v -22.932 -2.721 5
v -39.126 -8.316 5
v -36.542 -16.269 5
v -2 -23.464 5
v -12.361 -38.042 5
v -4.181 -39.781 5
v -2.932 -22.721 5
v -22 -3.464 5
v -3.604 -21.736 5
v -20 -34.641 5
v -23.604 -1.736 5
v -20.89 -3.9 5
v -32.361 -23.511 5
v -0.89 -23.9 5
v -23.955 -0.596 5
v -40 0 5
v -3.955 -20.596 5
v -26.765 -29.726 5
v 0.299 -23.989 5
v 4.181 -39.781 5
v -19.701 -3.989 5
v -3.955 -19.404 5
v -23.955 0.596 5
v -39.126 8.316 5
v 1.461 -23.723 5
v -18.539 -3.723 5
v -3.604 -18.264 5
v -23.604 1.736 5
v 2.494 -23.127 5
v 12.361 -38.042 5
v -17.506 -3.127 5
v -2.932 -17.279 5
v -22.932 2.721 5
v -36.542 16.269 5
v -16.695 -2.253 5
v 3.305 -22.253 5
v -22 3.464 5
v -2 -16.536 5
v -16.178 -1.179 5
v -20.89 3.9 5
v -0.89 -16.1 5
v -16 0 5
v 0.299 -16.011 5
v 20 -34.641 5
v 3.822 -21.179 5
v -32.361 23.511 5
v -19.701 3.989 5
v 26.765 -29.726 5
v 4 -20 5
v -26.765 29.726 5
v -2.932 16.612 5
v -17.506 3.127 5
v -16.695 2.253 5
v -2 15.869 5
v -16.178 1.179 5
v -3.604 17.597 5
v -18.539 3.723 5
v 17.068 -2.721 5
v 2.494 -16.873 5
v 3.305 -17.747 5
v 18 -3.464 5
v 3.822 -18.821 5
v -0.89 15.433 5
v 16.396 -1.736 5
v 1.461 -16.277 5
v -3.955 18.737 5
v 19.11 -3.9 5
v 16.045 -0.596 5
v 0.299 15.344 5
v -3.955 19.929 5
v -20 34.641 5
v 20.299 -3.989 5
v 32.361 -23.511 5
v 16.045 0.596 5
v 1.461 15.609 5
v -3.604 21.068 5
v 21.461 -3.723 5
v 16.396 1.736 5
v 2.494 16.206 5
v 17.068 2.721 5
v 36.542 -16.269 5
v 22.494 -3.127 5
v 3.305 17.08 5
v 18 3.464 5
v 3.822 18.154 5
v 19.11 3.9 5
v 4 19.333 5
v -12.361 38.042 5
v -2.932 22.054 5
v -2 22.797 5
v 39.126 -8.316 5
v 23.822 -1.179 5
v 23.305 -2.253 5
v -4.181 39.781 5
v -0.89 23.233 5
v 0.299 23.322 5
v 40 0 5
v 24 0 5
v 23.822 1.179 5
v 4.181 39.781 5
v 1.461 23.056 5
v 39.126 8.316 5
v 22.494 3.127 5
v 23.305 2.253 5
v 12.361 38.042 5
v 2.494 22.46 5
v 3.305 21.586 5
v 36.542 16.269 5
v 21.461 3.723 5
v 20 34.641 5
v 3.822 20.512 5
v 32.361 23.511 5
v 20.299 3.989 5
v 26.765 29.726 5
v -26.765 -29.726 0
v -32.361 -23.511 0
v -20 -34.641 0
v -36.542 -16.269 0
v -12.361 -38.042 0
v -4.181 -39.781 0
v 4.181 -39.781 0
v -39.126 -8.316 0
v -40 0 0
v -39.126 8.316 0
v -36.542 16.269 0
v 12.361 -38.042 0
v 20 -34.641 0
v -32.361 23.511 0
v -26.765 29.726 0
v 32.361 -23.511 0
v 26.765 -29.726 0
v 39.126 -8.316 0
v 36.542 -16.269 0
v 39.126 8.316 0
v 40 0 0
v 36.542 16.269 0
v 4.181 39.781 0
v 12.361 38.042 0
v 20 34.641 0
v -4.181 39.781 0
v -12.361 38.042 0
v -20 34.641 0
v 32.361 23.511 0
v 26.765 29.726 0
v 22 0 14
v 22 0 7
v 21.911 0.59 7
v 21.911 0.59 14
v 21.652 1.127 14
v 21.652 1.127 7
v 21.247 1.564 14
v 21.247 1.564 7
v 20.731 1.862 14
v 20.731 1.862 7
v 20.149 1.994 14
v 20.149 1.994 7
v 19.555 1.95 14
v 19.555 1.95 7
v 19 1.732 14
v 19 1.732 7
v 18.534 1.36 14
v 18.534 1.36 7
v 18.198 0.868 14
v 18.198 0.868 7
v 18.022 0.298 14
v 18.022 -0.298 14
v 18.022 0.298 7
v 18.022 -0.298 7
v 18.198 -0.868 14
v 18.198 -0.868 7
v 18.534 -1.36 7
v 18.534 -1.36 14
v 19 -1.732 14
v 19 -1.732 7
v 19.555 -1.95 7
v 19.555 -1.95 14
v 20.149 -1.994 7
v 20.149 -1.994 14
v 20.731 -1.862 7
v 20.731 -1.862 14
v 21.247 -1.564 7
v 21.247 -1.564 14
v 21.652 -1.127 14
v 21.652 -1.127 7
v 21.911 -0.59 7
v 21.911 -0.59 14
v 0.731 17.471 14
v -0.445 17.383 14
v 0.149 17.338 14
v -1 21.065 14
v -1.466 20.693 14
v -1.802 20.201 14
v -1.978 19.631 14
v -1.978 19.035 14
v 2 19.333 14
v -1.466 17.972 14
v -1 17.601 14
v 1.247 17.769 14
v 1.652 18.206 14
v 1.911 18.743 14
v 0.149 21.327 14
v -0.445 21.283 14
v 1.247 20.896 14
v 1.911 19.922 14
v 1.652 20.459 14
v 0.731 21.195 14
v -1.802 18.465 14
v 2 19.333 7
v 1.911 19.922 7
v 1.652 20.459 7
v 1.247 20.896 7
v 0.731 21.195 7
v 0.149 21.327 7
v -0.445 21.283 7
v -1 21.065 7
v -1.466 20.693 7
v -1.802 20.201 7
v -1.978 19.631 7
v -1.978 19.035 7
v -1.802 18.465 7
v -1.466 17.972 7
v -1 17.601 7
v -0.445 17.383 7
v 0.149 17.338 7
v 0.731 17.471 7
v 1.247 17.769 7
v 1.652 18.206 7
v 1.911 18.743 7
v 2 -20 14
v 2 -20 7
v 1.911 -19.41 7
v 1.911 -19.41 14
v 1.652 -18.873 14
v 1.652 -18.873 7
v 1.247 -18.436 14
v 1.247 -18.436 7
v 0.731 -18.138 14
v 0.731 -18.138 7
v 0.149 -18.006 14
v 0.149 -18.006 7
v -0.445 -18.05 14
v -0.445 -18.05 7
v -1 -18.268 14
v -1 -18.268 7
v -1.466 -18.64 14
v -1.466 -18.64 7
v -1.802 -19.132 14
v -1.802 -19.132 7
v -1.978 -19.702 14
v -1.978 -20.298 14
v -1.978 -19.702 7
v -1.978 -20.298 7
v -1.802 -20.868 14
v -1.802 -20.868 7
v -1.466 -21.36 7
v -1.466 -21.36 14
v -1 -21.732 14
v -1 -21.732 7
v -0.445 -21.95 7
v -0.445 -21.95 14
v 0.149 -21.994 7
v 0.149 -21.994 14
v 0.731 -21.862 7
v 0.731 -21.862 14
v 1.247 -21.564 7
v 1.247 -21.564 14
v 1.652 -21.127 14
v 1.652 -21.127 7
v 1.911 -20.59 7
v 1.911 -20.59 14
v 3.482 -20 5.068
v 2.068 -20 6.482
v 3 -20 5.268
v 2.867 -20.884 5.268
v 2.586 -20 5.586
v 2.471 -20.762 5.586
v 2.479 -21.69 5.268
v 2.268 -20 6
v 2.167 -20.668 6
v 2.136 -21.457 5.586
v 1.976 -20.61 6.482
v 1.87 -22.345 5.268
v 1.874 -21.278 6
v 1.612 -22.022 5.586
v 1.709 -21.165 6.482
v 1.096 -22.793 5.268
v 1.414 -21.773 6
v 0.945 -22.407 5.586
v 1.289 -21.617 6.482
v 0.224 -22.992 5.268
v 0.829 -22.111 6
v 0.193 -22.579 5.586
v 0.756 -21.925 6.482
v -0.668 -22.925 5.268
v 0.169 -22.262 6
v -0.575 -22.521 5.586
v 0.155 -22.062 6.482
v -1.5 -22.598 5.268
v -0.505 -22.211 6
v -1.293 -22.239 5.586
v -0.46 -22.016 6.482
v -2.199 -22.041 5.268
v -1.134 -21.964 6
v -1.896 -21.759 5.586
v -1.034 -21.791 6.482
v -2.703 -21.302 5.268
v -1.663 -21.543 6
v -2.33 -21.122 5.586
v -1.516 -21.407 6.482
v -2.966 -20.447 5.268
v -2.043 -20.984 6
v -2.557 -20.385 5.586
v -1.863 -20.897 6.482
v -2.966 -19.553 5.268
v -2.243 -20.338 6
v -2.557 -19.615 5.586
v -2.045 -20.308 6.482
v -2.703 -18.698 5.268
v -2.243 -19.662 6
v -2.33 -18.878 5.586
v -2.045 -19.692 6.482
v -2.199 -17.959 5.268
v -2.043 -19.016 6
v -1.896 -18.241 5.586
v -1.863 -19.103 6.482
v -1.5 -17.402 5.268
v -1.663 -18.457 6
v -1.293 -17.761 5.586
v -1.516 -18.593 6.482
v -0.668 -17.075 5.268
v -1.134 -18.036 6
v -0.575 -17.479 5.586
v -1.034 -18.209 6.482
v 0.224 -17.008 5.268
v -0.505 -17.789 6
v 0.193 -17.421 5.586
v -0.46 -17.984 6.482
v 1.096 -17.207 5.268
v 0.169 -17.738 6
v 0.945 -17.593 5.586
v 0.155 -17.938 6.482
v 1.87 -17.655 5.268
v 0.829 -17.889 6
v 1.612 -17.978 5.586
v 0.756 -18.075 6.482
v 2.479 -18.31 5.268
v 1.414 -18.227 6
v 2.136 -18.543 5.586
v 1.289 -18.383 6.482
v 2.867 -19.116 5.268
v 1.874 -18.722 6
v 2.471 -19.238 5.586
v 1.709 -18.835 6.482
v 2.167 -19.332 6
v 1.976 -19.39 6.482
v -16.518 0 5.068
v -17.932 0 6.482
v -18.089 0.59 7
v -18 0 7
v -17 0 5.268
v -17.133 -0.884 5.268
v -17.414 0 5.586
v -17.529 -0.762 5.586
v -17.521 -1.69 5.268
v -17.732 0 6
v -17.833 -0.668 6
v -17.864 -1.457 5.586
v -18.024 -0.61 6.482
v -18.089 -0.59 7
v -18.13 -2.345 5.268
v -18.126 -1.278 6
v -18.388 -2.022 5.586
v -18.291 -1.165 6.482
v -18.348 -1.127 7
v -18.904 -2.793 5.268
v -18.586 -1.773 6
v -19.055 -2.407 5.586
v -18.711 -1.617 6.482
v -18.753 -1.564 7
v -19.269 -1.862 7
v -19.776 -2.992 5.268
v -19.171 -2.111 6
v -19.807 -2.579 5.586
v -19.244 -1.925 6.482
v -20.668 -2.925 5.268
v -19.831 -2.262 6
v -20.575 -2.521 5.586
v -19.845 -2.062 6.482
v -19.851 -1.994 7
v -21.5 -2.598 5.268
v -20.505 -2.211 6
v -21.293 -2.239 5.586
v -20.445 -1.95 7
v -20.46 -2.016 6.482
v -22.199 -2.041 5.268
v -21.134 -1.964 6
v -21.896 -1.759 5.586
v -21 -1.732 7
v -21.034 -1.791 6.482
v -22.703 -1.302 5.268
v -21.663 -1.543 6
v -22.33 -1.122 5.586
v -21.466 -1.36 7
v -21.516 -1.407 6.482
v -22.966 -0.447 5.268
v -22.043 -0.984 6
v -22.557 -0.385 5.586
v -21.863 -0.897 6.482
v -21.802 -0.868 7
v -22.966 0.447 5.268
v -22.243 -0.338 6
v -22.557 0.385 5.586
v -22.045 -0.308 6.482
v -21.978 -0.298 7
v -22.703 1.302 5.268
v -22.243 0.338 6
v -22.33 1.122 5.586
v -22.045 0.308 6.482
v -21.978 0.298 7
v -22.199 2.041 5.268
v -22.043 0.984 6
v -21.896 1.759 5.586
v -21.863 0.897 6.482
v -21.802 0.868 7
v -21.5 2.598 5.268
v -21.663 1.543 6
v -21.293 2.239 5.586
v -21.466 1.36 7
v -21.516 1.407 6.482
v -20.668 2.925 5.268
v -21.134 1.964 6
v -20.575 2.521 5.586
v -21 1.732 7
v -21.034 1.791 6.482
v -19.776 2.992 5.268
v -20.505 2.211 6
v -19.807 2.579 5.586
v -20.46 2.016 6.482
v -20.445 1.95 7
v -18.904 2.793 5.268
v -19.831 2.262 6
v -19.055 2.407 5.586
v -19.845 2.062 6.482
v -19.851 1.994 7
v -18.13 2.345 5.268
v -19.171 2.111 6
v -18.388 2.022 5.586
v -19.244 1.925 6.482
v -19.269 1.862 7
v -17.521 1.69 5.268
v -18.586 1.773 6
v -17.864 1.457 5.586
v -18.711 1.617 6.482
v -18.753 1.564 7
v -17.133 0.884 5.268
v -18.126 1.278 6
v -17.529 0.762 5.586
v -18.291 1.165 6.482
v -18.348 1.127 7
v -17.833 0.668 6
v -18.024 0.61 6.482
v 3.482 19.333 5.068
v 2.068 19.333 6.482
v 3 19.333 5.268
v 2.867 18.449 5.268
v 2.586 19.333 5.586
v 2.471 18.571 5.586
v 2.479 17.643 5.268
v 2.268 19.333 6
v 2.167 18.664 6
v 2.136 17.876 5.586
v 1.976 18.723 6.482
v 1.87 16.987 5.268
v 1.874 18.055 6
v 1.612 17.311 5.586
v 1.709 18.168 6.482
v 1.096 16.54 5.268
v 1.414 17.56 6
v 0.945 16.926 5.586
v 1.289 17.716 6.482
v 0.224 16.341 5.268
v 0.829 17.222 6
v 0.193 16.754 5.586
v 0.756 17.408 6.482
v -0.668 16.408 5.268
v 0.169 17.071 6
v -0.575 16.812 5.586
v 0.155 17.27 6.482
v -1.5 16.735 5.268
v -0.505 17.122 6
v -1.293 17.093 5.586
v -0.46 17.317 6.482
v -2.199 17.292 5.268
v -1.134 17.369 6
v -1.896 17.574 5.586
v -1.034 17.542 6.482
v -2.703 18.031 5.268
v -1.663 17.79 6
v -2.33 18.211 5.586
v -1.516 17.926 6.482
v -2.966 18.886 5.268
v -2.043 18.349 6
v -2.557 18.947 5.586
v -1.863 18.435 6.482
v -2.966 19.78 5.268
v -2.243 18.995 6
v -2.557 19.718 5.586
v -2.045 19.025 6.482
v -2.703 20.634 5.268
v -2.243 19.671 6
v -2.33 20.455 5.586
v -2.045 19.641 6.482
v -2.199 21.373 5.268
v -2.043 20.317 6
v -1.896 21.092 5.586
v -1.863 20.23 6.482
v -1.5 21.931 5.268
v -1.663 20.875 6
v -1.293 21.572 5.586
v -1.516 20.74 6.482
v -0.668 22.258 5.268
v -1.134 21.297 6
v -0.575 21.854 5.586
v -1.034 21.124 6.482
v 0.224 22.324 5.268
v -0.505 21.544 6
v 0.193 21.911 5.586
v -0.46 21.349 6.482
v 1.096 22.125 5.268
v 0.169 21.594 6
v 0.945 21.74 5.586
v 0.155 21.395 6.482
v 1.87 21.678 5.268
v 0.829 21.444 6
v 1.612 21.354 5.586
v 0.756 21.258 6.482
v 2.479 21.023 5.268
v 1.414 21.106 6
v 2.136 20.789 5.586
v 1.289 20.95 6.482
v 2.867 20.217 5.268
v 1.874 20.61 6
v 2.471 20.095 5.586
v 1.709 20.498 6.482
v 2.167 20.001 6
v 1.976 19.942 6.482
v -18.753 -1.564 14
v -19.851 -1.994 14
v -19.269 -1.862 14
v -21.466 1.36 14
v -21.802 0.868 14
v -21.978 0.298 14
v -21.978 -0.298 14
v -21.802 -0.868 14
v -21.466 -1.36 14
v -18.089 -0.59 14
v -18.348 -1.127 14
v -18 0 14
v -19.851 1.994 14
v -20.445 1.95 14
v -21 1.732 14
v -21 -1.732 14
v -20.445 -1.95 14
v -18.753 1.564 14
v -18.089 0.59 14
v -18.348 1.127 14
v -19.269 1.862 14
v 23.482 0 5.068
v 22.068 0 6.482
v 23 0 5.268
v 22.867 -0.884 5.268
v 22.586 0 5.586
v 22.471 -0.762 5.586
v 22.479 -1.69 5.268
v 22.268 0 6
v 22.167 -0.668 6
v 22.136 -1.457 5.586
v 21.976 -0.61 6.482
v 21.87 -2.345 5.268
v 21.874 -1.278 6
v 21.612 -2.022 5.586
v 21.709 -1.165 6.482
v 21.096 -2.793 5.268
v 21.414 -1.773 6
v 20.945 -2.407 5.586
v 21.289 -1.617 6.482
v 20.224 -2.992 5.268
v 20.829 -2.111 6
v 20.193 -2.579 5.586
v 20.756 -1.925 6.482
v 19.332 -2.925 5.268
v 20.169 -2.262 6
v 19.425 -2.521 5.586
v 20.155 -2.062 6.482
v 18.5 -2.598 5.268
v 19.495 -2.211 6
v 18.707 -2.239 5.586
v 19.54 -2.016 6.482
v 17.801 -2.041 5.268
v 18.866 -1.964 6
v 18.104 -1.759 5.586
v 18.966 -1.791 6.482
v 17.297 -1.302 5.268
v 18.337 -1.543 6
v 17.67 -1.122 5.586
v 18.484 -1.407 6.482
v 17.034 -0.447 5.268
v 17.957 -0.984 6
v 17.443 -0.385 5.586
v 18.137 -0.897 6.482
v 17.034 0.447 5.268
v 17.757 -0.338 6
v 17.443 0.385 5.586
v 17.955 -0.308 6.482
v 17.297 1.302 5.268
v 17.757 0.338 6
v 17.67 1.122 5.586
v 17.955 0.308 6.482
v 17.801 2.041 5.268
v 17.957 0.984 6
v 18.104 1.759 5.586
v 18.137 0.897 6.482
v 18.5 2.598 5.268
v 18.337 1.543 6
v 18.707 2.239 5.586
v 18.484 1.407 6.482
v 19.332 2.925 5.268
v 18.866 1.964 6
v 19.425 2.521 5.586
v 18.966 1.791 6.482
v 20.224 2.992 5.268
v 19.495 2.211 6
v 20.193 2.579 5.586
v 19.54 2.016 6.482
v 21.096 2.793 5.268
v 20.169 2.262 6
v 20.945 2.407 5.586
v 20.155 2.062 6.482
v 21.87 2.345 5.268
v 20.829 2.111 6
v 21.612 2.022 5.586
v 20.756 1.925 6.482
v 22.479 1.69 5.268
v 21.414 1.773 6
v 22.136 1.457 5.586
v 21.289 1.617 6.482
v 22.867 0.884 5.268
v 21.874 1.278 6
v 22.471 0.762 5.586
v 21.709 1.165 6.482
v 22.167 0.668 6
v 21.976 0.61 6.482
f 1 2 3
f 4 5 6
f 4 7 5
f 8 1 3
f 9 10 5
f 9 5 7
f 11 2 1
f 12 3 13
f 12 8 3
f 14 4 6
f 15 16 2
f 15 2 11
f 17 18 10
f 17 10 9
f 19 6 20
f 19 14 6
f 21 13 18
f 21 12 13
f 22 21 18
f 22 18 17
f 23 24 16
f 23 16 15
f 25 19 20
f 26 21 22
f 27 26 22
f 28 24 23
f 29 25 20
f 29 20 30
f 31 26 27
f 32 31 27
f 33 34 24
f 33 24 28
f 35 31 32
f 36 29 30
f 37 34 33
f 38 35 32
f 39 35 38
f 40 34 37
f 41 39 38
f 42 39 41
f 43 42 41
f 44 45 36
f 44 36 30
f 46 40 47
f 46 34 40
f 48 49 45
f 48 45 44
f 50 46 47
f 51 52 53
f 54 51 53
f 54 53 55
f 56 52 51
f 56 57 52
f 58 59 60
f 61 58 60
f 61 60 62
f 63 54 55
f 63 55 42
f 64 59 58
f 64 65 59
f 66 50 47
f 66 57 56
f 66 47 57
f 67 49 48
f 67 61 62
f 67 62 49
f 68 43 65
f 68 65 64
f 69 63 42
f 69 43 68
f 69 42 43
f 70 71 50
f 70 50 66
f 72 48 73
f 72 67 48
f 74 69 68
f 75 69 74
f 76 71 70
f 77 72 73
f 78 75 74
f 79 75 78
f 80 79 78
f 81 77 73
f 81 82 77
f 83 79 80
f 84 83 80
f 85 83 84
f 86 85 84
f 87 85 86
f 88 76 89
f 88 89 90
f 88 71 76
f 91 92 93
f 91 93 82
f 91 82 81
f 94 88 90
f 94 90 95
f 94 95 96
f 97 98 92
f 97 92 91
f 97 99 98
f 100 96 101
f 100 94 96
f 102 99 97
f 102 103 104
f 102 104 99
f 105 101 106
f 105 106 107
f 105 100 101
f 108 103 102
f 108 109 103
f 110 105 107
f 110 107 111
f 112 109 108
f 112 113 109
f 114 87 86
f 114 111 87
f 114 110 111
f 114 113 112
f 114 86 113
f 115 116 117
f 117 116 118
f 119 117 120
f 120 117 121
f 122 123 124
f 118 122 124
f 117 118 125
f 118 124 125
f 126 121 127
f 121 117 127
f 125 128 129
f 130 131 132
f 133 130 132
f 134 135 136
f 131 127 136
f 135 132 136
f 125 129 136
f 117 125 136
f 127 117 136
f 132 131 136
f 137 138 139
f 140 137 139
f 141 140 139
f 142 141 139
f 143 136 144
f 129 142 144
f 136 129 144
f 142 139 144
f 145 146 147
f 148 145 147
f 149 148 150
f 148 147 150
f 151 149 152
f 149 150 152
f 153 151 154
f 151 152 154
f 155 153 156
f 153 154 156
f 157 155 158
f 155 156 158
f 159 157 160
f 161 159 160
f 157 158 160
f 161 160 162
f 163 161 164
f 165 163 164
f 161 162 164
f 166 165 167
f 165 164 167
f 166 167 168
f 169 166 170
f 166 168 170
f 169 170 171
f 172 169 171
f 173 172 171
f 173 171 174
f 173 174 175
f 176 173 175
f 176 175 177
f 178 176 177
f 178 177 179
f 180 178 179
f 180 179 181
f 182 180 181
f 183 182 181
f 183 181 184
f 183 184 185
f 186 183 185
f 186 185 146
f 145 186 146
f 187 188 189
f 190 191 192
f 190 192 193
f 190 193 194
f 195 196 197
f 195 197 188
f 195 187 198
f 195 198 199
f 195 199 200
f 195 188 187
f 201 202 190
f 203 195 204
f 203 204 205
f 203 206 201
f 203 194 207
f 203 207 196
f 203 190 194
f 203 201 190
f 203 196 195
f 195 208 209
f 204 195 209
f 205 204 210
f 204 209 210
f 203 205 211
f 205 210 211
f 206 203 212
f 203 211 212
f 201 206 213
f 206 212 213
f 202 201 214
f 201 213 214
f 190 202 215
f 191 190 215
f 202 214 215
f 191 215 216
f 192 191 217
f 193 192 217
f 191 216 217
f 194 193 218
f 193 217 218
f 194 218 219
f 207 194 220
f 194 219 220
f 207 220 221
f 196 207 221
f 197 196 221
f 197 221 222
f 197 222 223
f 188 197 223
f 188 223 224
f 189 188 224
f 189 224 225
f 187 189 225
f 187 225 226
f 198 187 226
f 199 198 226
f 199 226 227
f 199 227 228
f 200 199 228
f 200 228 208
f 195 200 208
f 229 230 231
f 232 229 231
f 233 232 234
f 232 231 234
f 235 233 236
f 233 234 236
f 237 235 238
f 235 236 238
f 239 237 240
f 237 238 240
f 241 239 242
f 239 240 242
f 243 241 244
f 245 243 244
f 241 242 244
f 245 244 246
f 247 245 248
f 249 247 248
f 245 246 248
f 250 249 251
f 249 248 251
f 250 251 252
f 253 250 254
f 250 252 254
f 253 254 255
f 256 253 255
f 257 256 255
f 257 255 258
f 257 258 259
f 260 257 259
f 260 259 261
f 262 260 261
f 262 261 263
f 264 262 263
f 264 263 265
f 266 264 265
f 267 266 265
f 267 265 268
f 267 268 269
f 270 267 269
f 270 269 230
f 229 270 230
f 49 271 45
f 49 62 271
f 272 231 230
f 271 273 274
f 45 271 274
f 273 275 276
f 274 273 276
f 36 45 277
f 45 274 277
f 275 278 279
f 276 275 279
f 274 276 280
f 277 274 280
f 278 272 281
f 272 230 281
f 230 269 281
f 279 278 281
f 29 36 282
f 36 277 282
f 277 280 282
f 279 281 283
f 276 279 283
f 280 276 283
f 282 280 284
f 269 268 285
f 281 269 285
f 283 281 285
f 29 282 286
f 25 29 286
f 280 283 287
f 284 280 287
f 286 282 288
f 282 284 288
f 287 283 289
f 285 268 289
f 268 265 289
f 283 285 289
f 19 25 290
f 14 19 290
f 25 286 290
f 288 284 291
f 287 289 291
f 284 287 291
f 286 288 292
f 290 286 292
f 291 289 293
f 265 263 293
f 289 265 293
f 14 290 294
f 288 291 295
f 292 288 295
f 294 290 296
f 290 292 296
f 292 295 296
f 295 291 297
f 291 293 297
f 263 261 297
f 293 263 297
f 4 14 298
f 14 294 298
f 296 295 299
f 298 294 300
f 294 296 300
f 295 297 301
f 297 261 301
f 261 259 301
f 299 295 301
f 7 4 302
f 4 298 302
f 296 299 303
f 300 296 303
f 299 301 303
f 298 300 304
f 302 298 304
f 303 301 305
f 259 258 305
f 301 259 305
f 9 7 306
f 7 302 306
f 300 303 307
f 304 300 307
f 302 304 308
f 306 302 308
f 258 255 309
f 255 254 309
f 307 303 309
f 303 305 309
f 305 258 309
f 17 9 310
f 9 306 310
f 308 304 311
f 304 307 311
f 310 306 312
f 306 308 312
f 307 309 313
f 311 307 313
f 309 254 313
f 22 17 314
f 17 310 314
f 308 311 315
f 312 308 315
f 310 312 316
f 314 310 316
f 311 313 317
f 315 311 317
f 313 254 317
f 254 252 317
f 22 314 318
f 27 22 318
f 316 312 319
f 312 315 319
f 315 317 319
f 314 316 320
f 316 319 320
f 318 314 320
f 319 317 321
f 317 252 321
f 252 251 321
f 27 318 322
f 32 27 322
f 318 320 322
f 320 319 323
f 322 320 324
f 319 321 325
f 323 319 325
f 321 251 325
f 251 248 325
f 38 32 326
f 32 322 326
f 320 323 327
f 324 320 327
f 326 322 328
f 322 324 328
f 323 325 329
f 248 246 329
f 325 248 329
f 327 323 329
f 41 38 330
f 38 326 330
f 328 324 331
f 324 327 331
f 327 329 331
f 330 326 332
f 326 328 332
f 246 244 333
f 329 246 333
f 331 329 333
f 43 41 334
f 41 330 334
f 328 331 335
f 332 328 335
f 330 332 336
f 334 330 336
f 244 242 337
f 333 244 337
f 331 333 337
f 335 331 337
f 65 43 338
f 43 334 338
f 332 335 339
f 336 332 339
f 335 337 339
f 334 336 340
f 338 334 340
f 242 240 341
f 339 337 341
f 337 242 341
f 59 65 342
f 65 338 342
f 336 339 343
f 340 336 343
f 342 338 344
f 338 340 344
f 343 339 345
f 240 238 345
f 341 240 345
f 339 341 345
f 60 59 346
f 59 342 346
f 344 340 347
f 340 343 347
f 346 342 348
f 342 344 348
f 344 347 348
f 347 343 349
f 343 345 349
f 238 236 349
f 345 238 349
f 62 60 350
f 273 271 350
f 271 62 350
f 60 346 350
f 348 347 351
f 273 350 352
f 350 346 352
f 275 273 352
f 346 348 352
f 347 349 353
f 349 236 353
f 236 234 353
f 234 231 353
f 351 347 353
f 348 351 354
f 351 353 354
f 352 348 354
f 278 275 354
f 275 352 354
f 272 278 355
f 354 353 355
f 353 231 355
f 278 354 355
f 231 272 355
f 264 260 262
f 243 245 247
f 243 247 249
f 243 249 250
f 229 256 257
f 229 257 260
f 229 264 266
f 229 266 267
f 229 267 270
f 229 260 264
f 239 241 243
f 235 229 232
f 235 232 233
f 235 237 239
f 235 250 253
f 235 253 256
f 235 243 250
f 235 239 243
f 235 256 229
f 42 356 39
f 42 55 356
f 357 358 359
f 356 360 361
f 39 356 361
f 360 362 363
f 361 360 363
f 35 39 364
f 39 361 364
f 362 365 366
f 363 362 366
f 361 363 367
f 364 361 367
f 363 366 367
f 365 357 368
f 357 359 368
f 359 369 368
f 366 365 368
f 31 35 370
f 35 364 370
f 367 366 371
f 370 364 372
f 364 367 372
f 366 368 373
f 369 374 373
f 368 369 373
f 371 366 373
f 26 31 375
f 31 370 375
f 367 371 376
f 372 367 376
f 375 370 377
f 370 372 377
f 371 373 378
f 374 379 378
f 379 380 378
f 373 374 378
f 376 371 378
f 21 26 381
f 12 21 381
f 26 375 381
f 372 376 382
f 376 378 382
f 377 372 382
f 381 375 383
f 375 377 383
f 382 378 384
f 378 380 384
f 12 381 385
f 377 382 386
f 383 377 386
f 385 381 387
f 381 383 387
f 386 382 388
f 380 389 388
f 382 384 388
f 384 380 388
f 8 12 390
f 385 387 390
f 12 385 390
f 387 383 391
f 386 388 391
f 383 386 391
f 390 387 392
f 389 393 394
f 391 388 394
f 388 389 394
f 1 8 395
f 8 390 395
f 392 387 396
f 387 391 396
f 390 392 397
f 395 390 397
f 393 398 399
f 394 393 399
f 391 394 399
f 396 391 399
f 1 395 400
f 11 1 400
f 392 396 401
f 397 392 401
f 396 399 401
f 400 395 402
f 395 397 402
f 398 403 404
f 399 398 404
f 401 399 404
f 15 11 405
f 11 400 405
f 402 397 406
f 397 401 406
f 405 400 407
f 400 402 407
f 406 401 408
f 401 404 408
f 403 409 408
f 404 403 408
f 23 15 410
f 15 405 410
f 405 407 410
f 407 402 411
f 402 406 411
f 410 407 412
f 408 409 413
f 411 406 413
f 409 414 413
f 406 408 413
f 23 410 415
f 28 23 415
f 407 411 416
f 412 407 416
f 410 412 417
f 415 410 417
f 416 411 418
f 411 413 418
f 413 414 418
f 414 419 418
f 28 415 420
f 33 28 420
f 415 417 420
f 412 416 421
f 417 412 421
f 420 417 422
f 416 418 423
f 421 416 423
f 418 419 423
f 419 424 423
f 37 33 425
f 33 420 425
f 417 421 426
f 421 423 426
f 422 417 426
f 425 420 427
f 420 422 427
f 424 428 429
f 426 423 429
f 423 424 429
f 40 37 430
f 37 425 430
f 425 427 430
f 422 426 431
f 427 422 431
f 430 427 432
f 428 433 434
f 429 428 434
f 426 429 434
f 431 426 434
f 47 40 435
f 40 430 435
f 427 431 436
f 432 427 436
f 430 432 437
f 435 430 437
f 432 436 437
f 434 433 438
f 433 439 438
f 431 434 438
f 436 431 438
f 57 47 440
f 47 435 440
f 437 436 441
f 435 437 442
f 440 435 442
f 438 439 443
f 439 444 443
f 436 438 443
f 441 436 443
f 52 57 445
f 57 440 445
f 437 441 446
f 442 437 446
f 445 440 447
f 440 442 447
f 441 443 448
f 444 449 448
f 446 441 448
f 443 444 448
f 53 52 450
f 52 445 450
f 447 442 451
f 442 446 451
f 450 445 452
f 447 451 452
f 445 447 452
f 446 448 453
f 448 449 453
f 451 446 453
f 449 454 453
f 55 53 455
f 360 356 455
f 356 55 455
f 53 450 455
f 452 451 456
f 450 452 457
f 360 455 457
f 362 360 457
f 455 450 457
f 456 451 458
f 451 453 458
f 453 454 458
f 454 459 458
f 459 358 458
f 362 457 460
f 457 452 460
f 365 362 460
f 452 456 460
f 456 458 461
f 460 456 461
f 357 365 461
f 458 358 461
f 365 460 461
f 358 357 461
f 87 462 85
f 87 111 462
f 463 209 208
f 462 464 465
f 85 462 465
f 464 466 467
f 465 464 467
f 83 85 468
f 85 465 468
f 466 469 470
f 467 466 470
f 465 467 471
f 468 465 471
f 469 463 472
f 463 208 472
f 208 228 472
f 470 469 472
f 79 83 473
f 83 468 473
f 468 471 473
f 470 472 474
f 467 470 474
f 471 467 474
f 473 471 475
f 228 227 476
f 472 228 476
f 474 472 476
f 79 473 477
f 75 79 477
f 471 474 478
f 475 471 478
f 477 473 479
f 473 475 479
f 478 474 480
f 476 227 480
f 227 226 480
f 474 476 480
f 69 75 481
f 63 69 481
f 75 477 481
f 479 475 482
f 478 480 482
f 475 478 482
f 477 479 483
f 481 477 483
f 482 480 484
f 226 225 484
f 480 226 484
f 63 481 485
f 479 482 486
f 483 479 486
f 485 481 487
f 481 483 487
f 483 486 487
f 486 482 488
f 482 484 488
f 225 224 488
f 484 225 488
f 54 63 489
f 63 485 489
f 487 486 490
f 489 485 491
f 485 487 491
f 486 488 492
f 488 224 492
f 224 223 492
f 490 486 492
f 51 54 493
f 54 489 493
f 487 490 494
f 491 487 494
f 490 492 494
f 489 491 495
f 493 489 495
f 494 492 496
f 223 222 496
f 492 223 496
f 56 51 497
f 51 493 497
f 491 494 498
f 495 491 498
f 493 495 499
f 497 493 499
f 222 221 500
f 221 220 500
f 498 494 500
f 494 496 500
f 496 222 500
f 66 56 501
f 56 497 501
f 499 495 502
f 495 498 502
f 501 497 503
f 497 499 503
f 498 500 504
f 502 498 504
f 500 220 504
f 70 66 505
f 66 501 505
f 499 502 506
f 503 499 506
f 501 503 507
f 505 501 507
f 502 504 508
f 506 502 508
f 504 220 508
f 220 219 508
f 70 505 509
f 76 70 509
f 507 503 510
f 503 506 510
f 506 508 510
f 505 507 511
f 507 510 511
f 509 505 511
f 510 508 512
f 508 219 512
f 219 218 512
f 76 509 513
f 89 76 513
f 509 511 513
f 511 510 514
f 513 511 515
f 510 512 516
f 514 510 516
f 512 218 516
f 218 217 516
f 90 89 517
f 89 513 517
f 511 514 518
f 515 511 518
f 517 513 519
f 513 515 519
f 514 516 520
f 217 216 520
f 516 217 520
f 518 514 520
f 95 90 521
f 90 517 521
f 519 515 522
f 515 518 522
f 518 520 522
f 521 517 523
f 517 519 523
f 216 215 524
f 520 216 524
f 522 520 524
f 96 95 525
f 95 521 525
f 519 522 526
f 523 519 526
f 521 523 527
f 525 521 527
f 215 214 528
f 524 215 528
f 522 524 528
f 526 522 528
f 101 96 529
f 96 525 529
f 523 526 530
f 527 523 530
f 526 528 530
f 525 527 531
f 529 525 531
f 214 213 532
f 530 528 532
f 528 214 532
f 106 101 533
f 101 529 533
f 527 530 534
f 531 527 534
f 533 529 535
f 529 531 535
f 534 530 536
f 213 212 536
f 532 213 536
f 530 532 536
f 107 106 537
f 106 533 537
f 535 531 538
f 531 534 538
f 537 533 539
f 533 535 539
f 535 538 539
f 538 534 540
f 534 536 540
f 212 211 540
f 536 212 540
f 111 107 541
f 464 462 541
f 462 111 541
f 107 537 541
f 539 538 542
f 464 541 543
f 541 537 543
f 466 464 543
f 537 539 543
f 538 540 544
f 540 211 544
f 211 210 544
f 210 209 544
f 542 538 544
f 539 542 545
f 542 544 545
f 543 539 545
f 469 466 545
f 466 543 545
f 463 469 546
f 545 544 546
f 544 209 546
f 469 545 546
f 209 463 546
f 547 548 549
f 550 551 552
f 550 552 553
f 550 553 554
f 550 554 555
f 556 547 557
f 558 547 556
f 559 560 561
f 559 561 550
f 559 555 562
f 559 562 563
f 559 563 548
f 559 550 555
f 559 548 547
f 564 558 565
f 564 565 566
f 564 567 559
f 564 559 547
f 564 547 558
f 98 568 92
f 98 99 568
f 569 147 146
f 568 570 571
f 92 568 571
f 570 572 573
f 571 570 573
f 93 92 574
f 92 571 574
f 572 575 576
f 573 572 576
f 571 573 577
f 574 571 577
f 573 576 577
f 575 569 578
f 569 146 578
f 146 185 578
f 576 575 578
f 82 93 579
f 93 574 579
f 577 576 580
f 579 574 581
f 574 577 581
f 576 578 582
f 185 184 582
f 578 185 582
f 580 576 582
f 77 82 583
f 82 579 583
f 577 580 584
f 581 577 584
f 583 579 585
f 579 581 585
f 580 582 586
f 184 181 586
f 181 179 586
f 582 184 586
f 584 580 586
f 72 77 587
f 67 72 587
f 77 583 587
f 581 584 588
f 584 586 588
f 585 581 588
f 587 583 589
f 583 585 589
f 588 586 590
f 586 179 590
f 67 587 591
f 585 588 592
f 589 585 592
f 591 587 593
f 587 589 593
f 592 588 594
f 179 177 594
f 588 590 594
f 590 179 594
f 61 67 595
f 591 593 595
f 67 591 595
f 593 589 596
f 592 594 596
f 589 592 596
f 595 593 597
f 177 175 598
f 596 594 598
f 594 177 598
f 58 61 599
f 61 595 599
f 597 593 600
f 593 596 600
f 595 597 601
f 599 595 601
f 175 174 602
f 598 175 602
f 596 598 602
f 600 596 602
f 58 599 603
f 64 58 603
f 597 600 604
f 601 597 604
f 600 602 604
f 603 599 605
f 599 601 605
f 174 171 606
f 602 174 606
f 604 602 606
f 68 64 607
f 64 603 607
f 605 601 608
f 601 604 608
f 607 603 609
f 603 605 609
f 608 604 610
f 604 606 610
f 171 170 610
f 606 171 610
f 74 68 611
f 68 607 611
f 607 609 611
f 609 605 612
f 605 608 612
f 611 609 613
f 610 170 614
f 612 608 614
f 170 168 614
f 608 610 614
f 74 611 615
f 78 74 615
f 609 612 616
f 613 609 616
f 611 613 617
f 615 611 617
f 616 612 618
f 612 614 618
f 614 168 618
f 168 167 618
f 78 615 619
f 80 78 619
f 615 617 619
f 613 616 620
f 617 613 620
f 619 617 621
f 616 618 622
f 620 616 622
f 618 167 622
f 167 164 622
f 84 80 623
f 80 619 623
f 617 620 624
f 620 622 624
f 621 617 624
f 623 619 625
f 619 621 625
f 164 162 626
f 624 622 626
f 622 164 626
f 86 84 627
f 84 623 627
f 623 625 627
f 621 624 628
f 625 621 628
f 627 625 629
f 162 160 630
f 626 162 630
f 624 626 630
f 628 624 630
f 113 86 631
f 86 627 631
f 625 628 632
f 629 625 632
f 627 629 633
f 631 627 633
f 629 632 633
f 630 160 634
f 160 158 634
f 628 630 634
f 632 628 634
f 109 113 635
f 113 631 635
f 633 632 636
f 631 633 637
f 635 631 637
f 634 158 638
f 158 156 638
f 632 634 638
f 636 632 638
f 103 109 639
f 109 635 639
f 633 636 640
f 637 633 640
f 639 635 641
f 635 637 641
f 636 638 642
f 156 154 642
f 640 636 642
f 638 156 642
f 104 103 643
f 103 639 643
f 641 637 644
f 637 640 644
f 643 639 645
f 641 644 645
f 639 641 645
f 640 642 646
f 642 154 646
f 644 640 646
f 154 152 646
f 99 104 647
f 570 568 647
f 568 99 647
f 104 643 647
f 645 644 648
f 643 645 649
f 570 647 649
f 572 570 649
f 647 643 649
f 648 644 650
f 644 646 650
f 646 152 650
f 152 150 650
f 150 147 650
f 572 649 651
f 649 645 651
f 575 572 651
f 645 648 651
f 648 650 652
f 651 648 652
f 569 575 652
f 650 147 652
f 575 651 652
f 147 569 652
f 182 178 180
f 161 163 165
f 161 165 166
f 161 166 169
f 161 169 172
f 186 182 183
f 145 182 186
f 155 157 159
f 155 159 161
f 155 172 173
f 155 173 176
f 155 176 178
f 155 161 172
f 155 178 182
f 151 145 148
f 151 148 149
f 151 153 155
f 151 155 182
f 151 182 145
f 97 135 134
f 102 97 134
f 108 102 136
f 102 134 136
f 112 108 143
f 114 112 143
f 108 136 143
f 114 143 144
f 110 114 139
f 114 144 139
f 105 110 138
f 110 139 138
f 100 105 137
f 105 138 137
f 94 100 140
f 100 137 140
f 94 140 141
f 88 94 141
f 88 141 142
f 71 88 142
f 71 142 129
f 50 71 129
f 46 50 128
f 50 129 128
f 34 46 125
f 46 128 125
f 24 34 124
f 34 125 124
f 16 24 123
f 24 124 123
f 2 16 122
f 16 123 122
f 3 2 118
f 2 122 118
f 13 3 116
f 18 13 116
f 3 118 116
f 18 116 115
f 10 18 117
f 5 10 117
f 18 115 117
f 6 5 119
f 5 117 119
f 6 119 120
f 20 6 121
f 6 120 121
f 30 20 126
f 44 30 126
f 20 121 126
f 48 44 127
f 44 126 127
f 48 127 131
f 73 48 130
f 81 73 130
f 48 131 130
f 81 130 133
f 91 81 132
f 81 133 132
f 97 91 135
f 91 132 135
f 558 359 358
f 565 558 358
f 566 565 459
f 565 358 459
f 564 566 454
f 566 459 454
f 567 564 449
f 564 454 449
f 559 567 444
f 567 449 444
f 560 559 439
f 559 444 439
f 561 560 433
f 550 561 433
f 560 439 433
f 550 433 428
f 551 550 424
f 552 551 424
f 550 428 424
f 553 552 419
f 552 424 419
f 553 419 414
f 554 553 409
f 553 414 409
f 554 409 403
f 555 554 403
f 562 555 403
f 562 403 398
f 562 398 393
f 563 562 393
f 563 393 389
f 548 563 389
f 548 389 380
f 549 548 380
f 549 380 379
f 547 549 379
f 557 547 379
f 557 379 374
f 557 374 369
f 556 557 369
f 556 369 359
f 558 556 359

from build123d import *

# Parameters (mm, degrees)
F1_R     = 2
F2_DEPTH = 14
F0_R     = 40
F3_DEPTH = 5
F5_R     = 2


with BuildPart() as f2:
    # F1 (on face) → F2 (new body)
    with BuildSketch(Plane.XY):
        with Locations((0, 19.332828)):
            Circle(F1_R)
        with Locations((-20, 0)):
            Circle(F1_R)
        with Locations((20, 0)):
            Circle(F1_R)
        with Locations((0, -20)):
            Circle(F1_R)
    extrude(amount=F2_DEPTH)


with BuildPart() as f3:
    # F0 (on Top) → F3 (new body)
    with BuildSketch(Plane.XY):
        Circle(F0_R)
    extrude(amount=F3_DEPTH)

    # F4: union F2
    add(f2.part)

    # F5
    f5_edges = [f3.edges().sort_by_distance(p)[0] for p in [
        (-2, -20, 5),
        (-22, 0, 5),
        (18, 0, 5),
        (-2, 19.332828, 5),
    ]]
    fillet(f5_edges, radius=F5_R)


solid = f3.part
